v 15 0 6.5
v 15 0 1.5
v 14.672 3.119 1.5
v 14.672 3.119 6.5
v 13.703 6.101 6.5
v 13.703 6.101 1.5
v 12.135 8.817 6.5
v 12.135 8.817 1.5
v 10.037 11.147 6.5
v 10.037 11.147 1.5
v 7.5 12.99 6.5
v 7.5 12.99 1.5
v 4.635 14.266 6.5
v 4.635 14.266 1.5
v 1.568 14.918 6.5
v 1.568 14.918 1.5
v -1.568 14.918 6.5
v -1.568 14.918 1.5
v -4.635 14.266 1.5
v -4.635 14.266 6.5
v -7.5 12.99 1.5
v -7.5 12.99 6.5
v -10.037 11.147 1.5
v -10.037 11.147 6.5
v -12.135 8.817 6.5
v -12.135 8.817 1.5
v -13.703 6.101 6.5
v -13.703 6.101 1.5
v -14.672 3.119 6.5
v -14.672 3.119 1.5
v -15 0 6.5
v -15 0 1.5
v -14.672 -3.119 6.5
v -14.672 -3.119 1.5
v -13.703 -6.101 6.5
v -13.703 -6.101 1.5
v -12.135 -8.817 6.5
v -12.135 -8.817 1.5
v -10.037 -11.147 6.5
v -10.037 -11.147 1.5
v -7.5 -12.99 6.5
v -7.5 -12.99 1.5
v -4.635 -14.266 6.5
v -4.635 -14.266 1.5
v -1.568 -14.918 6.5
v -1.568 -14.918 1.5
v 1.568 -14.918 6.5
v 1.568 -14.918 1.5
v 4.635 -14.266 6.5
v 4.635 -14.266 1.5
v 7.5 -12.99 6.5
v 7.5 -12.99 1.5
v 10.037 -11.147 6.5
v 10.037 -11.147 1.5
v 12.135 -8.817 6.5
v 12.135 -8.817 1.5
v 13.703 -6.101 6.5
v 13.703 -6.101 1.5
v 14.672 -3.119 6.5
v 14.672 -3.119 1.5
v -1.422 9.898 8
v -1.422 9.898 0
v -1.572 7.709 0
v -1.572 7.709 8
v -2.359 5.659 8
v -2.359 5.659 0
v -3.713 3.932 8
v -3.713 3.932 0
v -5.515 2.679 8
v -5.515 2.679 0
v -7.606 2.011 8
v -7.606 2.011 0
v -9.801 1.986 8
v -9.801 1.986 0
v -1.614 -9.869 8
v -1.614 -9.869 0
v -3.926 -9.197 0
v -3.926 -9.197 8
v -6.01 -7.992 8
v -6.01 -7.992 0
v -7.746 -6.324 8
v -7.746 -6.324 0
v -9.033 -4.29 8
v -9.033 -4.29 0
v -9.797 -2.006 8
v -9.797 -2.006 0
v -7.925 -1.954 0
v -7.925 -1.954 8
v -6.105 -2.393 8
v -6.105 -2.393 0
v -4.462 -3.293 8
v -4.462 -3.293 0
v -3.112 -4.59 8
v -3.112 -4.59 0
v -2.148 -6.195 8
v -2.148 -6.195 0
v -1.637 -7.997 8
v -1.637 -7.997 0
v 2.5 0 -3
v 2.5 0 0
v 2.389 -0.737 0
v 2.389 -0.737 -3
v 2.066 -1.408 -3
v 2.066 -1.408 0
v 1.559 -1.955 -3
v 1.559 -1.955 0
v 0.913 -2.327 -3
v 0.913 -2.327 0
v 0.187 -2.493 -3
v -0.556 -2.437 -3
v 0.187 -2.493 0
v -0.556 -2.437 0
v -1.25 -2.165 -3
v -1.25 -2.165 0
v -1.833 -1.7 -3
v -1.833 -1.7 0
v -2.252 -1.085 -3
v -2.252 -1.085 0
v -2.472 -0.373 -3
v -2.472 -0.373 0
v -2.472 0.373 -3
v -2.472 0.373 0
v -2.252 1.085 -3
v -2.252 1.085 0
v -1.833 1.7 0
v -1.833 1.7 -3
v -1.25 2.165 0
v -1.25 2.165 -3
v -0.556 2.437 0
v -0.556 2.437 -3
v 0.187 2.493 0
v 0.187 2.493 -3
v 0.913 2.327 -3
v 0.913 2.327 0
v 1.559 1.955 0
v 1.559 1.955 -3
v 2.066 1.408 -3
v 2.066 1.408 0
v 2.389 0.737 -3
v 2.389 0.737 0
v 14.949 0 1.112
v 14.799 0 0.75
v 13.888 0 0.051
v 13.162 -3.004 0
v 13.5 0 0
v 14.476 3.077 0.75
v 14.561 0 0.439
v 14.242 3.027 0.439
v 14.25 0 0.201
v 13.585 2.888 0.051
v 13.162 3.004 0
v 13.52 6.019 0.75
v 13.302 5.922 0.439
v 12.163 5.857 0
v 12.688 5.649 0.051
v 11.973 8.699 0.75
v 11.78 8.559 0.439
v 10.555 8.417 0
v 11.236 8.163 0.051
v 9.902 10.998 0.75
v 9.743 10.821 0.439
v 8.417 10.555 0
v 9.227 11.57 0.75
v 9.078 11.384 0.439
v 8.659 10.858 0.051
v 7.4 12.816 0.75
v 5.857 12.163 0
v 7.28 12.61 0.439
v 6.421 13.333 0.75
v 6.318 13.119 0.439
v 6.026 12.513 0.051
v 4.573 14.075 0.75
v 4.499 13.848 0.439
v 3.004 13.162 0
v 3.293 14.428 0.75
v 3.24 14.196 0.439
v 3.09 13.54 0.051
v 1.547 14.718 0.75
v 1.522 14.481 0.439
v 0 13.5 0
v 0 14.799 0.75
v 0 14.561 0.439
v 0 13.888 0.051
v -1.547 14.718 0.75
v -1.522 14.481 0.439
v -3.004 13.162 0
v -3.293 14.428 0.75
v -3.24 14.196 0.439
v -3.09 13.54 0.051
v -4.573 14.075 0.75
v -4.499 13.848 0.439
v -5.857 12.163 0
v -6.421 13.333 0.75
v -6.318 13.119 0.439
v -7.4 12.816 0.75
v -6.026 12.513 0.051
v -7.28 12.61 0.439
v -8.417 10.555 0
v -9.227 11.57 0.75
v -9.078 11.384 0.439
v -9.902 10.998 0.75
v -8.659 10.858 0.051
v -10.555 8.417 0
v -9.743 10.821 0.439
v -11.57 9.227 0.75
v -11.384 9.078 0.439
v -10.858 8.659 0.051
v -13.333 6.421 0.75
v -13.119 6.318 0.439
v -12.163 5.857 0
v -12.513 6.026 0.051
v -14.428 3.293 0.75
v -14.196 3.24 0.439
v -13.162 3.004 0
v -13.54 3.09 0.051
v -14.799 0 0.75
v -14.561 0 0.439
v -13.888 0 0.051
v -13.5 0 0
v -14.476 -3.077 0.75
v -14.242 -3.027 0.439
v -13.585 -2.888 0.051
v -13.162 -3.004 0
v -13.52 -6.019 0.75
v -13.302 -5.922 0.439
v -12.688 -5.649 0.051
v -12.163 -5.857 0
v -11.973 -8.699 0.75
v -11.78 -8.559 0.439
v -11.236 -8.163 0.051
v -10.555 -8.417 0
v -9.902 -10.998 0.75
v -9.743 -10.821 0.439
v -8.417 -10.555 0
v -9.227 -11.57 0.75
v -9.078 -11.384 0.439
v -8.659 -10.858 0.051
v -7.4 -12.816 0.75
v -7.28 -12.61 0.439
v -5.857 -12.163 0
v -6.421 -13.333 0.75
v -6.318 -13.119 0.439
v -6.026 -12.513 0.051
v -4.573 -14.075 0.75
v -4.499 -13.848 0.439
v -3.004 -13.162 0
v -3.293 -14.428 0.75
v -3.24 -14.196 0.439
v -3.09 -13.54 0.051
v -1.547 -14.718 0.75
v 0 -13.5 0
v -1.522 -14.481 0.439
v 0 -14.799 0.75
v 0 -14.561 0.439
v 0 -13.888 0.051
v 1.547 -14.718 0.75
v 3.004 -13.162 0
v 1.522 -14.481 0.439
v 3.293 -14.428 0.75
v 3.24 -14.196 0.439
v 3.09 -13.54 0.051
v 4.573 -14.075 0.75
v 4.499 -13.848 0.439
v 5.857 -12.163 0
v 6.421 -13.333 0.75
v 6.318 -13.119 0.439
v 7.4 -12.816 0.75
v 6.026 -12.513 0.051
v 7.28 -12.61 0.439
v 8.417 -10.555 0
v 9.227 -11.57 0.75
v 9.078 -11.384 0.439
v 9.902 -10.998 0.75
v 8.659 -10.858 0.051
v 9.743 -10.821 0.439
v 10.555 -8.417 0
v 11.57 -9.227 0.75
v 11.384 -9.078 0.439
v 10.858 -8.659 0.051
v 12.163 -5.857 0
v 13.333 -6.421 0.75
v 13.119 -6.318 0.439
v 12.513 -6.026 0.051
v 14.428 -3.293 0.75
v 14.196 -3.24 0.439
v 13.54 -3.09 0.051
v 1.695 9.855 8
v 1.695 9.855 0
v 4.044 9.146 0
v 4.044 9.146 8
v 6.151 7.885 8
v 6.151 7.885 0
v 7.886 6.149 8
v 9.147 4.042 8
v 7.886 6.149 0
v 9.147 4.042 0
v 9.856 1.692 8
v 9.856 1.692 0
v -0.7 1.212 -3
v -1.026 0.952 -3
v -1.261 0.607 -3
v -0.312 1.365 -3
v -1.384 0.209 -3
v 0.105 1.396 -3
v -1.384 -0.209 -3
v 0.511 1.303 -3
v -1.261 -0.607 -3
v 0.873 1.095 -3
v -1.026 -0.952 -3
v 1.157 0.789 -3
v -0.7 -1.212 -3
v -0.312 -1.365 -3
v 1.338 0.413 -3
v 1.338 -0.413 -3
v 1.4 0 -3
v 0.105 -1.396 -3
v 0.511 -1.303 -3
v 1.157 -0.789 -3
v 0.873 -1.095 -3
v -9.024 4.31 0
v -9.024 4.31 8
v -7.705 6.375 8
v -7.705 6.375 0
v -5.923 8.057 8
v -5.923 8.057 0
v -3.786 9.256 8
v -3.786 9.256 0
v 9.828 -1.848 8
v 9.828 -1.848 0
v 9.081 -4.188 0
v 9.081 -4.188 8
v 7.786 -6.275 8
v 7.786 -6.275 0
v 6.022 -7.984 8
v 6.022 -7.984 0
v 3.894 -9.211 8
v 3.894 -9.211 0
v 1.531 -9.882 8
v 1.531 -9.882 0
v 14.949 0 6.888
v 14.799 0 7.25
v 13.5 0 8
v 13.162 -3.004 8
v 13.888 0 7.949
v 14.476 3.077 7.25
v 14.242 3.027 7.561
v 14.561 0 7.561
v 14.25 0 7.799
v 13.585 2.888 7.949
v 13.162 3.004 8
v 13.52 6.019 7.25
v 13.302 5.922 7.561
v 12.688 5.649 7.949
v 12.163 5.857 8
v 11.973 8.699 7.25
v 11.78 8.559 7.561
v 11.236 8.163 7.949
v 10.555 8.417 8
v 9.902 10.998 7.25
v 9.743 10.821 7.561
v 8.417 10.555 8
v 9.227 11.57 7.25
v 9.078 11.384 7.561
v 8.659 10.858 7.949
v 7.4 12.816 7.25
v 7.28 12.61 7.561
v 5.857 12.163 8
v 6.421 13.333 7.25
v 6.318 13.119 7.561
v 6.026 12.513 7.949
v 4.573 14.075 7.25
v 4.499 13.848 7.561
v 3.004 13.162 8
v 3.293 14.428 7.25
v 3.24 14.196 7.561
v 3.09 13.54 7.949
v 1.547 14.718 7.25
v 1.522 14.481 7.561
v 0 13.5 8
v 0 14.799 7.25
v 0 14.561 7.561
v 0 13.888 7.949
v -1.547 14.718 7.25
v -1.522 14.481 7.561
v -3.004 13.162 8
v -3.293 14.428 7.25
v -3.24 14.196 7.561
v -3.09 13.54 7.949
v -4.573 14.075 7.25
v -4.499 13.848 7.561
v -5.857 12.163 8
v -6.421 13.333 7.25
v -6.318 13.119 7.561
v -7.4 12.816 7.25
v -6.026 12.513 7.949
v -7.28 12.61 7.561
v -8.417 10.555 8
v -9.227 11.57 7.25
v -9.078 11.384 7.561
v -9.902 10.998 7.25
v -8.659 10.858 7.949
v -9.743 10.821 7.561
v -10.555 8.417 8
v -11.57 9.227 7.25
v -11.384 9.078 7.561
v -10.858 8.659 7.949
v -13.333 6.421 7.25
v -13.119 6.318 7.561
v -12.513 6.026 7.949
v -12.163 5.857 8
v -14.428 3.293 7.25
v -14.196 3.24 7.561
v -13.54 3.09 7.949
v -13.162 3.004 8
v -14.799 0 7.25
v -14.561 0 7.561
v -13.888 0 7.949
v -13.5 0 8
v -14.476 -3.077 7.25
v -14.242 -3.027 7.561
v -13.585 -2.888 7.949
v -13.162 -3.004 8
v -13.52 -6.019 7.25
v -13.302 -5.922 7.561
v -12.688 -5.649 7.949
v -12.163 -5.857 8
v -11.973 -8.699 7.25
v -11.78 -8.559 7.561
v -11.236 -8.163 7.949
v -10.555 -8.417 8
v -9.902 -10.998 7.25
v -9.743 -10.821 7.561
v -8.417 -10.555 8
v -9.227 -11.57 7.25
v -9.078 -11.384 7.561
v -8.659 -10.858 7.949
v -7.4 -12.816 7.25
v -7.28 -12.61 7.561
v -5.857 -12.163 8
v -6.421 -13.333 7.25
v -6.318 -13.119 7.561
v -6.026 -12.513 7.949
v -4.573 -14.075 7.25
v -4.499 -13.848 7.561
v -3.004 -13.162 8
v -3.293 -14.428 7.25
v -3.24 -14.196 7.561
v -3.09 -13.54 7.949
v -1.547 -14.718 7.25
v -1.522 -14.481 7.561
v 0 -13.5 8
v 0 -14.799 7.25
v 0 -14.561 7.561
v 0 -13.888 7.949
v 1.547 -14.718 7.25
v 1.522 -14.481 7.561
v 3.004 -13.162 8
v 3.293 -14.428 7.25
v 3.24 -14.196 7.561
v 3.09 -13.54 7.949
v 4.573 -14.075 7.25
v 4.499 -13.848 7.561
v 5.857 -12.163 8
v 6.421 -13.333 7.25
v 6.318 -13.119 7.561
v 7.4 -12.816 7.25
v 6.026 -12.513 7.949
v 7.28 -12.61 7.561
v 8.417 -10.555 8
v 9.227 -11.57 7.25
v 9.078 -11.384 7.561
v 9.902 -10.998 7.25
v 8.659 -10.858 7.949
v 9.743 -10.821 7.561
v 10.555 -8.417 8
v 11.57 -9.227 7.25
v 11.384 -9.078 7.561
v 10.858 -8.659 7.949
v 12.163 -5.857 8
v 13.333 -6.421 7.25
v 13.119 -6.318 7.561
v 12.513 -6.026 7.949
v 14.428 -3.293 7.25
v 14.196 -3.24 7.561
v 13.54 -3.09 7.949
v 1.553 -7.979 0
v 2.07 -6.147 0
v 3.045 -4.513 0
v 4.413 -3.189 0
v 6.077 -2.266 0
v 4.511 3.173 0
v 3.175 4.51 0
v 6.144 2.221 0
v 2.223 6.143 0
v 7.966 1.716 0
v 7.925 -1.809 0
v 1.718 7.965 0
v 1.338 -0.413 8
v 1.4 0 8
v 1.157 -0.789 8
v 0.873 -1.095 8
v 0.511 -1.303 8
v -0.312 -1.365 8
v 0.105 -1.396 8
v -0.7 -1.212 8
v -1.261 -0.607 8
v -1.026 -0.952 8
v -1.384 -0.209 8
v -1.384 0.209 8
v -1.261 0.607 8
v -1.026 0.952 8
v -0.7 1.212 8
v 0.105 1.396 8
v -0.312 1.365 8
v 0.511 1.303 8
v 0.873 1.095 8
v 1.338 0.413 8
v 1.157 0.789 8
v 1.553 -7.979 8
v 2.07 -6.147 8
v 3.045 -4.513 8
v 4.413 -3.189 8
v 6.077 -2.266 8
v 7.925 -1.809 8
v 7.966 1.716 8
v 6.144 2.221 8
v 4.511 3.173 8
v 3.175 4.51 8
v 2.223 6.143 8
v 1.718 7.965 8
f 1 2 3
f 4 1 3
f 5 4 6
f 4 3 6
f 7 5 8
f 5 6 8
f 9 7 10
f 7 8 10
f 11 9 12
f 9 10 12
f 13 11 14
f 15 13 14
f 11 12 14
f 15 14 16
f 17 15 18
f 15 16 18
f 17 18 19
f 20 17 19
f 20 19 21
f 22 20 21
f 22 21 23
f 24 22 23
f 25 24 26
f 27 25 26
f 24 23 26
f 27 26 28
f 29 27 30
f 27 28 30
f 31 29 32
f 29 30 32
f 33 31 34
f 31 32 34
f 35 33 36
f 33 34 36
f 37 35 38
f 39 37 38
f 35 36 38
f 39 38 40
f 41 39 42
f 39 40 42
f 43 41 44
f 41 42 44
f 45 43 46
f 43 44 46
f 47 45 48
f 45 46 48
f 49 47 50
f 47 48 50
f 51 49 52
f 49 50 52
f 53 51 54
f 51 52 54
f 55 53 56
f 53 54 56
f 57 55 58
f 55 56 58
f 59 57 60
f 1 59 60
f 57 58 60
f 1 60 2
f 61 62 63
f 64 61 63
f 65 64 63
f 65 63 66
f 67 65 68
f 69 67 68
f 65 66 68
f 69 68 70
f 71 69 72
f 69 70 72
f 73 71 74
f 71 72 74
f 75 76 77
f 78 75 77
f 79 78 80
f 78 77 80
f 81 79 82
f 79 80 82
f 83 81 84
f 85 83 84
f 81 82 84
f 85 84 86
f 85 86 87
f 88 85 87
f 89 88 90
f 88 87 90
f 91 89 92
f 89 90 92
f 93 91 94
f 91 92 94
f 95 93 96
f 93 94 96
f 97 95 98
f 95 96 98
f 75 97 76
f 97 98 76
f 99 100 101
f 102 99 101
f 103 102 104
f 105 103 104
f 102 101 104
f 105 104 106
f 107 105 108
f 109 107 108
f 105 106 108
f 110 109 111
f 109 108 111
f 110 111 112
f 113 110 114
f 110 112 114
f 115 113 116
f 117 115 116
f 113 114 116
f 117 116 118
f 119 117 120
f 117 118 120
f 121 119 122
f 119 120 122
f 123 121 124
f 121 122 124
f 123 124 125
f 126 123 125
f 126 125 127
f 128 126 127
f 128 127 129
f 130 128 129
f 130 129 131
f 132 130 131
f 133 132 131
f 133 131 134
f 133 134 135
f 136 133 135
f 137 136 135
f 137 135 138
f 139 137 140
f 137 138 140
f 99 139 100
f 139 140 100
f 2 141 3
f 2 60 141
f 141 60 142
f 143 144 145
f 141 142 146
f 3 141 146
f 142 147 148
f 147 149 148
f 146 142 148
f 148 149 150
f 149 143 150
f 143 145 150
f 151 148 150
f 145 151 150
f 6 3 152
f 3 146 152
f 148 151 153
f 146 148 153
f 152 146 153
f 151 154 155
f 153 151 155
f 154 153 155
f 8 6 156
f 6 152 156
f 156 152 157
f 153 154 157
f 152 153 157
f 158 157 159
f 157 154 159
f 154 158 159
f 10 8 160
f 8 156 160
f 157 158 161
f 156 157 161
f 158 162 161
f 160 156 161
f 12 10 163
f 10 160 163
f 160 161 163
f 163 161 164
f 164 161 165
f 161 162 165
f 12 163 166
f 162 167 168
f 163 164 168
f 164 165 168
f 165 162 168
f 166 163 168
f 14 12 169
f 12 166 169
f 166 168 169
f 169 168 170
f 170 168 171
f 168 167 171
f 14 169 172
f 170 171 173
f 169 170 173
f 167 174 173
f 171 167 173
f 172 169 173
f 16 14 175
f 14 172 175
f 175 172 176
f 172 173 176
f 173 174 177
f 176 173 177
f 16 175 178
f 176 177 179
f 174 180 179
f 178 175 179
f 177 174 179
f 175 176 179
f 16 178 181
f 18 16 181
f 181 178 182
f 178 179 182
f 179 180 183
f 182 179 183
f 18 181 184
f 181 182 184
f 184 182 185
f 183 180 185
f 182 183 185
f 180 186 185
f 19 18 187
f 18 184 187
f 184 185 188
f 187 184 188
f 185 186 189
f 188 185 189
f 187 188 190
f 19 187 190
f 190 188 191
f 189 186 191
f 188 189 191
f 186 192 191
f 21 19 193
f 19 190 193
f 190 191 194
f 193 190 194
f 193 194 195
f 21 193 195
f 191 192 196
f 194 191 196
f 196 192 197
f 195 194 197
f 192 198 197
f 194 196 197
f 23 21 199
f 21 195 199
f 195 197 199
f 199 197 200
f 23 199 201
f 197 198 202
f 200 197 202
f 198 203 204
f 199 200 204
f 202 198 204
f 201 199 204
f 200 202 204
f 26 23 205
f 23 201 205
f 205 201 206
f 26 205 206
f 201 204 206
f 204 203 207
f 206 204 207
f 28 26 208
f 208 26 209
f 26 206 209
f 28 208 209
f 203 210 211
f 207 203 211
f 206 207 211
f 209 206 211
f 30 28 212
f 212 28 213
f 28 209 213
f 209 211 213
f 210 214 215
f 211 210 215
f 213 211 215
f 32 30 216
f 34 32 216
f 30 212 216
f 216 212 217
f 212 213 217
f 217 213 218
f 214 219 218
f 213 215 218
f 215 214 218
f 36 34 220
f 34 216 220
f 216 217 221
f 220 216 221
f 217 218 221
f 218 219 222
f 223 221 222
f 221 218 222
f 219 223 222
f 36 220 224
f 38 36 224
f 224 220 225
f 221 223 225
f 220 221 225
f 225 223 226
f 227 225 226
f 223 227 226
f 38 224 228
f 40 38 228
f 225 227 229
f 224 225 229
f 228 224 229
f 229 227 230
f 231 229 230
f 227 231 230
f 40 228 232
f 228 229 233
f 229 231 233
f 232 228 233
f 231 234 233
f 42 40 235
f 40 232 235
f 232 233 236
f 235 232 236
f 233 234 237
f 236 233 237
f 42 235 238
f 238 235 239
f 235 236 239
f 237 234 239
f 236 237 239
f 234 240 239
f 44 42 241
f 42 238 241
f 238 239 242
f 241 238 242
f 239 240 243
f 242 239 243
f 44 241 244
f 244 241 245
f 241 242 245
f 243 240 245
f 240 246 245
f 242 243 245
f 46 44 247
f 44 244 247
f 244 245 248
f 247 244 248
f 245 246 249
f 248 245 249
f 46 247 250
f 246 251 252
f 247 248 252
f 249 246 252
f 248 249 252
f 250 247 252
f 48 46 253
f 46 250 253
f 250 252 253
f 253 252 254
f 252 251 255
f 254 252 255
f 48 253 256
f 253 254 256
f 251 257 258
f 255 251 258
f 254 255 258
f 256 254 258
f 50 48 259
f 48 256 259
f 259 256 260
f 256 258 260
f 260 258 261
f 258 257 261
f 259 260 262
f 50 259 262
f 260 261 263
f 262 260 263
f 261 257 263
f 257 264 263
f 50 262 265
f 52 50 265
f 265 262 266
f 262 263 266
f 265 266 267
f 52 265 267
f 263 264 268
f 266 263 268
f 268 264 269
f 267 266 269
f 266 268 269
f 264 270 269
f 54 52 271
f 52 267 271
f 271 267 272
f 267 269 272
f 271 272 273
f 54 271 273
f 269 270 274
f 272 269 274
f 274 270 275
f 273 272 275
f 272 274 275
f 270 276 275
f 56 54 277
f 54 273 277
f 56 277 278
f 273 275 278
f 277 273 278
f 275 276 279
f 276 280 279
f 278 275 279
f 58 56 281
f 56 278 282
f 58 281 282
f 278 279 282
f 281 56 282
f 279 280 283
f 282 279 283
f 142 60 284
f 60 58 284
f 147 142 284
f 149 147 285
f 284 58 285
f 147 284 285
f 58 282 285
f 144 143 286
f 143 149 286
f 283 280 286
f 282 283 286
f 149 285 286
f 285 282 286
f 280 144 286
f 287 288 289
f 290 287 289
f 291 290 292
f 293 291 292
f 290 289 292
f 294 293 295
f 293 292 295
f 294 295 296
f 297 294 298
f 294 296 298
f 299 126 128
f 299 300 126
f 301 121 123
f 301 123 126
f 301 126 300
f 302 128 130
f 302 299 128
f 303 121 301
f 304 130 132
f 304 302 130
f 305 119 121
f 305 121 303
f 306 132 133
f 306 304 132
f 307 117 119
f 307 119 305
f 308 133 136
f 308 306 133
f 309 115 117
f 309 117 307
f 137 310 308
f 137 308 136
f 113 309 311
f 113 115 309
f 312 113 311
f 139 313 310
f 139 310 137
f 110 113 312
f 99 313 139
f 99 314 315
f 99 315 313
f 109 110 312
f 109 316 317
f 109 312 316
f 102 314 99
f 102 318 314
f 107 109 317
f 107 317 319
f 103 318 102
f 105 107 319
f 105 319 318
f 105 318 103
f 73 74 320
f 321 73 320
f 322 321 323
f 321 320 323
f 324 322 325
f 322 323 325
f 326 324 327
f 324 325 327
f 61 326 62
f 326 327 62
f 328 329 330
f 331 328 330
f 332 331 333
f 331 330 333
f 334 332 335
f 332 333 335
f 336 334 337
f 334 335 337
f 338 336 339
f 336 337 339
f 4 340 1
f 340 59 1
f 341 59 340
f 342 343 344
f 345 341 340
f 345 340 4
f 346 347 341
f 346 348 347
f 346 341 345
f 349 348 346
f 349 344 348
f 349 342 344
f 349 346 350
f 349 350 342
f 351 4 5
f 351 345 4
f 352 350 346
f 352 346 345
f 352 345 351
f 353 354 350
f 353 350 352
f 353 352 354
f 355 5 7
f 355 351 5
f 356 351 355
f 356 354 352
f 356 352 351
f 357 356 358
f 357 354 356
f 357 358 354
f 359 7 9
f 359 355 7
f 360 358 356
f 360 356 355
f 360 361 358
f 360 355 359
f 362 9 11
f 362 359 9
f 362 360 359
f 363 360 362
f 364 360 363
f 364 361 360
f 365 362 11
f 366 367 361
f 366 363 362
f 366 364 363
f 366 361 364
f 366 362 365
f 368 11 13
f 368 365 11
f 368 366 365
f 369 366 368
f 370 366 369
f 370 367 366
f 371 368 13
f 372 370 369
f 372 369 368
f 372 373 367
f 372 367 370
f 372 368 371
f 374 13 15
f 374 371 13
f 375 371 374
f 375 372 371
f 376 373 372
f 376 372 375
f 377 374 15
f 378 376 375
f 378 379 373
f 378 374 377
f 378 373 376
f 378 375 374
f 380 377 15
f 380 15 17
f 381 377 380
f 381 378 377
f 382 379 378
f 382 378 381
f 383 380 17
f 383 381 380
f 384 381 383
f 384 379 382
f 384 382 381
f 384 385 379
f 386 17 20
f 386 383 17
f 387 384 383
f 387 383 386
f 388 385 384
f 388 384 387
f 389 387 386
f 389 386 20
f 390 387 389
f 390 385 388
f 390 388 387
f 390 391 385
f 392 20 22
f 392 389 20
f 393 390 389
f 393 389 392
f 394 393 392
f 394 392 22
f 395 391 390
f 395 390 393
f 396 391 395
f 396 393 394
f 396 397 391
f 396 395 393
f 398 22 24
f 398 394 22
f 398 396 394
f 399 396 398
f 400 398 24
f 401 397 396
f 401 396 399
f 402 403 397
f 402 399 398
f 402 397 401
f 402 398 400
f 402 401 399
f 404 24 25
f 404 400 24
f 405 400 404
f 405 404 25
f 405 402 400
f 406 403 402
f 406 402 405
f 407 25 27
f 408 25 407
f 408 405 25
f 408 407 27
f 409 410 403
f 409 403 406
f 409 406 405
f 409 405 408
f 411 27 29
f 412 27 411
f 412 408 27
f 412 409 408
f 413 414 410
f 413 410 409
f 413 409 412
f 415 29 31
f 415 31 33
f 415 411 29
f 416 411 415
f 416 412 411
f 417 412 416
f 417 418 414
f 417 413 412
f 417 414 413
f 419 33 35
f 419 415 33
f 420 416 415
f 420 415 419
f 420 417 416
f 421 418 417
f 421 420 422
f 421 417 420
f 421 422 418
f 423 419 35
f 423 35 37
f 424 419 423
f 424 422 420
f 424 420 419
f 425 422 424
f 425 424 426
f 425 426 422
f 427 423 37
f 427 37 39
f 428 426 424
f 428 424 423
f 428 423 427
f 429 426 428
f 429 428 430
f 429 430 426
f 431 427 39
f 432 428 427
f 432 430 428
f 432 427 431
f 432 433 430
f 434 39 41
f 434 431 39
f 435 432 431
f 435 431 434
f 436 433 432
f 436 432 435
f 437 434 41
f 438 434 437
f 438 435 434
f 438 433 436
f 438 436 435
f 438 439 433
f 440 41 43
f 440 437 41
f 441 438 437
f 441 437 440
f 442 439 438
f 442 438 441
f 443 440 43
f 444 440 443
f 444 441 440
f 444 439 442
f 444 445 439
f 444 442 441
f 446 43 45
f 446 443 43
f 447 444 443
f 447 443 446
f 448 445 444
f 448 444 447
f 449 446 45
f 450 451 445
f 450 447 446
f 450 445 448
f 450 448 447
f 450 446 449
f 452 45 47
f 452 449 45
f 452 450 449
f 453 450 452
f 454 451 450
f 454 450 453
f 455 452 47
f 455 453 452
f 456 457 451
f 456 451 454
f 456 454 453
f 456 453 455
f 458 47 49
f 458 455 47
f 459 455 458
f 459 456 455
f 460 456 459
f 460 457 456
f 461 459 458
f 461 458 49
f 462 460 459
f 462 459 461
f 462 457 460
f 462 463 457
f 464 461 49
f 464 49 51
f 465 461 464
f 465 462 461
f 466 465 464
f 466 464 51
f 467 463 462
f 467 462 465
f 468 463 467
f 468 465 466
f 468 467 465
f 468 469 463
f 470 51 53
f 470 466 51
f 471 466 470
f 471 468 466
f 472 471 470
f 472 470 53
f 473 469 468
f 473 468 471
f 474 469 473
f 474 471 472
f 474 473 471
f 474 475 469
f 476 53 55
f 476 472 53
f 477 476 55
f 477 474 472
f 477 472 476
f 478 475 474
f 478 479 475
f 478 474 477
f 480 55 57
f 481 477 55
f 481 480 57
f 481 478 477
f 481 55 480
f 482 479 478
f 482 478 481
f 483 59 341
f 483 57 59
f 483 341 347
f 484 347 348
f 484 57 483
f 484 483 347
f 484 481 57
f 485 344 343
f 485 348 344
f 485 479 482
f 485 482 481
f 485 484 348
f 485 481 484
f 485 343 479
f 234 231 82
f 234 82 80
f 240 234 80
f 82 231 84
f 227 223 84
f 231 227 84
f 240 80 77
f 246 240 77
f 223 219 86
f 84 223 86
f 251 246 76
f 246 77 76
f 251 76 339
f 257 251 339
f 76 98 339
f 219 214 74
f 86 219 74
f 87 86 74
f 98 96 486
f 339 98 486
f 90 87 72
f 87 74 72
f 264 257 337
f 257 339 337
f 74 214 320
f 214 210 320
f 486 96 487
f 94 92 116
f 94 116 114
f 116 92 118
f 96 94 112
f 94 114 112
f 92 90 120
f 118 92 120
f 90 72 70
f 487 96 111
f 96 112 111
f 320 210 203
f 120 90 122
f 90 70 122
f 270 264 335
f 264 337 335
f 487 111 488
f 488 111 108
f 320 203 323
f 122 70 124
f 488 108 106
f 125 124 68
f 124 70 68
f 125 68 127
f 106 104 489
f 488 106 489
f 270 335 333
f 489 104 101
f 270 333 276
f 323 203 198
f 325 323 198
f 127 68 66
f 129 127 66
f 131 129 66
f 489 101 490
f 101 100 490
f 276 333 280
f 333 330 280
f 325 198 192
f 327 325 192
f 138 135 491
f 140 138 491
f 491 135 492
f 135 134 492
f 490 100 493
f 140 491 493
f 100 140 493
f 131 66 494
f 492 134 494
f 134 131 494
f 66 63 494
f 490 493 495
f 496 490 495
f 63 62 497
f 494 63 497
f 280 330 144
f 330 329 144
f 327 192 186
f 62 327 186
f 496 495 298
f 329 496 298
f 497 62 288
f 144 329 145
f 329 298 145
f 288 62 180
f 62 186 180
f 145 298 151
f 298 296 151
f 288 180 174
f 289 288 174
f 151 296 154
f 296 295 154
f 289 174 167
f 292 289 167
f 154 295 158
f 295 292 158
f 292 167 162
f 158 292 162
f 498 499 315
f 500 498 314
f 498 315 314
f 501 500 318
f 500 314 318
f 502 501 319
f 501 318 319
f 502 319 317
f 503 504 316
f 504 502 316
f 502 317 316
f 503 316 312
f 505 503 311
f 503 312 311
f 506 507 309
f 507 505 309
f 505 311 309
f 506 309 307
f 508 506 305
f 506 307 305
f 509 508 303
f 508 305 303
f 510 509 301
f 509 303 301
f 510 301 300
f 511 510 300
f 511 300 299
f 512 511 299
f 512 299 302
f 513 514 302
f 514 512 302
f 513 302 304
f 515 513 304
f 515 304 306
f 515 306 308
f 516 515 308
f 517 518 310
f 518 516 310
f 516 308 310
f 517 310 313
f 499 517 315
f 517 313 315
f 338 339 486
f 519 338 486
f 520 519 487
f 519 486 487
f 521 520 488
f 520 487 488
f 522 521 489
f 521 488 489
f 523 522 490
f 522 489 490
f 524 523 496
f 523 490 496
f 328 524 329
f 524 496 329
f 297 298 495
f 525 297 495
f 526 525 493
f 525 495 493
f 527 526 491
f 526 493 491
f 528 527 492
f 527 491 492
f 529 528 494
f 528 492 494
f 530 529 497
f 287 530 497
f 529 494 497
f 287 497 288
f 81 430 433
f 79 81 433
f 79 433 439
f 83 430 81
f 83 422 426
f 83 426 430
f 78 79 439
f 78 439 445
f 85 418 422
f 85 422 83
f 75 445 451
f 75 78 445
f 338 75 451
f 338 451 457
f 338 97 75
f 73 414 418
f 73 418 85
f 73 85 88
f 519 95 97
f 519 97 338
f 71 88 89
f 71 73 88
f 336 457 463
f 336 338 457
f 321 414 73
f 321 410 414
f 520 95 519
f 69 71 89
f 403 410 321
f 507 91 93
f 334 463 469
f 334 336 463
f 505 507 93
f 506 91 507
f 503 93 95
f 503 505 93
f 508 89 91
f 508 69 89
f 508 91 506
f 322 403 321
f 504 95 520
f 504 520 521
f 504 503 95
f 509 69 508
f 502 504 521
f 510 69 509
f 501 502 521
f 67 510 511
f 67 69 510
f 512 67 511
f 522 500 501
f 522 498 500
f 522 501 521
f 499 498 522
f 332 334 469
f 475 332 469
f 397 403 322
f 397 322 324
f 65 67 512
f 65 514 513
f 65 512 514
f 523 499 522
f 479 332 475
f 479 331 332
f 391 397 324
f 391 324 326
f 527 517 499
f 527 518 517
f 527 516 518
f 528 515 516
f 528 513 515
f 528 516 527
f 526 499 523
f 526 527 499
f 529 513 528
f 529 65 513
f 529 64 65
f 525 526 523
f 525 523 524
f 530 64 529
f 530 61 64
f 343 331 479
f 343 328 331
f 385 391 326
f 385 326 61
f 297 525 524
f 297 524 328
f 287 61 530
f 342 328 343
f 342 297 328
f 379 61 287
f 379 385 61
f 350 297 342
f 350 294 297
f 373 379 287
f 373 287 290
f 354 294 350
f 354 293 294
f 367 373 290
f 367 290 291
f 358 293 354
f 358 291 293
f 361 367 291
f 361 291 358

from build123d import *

# Parameters (mm, degrees)
F0_R     = 15
F0_R_2   = 1.4
F1_DEPTH = 8
F2_R     = 1.5
F3_R     = 1.5
F4_R     = 2.5
F5_DEPTH = 3
F6_R     = 1.4
F7_DEPTH = 25


with BuildPart() as f1:
    # F0 (on Top) → F1 (new body)
    with BuildSketch(Plane.XY):
        Circle(F0_R)
        with BuildLine():
            ThreePointArc((-9.796631, -2.006496), (-3.744207, -3.896689), (-1.614051, -9.868882))
            ThreePointArc((-1.614051, -9.868882), (-6.928578, -7.210743), (-9.796631, -2.006496))
        make_face(mode=Mode.SUBTRACT)
        with BuildLine():
            ThreePointArc((1.531464, -9.882035), (3.685338, -3.80578), (9.827695, -1.848356))
            ThreePointArc((9.827695, -1.848356), (6.956481, -7.183827), (1.531464, -9.882035))
        make_face(mode=Mode.SUBTRACT)
        with BuildLine():
            ThreePointArc((-9.80076, 1.986231), (-6.865646, 7.270688), (-1.421798, 9.898408))
            ThreePointArc((-1.421798, 9.898408), (-3.712984, 3.932034), (-9.80076, 1.986231))
        make_face(mode=Mode.SUBTRACT)
        Circle(F0_R_2, mode=Mode.SUBTRACT)
        with BuildLine():
            ThreePointArc((9.855809, 1.692051), (3.799696, 3.798731), (1.694555, 9.855378))
            ThreePointArc((1.694555, 9.855378), (7.071966, 7.070169), (9.855809, 1.692051))
        make_face(mode=Mode.SUBTRACT)
    extrude(amount=F1_DEPTH)

    # F2
    f2_edges = [f1.edges().sort_by_distance(p)[0] for p in [
        (-15, 0, 8),
    ]]
    fillet(f2_edges, radius=F2_R)

    # F3
    f3_edges = [f1.edges().sort_by_distance(p)[0] for p in [
        (-15, 0, 0),
    ]]
    fillet(f3_edges, radius=F3_R)

    # F4 (on face) → F5 (join)
    with BuildSketch(Plane(origin=(0, 0, 0), x_dir=(1, 0, 0), z_dir=(0, 0, -1))):
        Circle(F4_R)
    extrude(amount=F5_DEPTH)

    # F6 (on face) → F7 (cut)
    with BuildSketch(Plane(origin=(0, 0, -3), x_dir=(1, 0, 0), z_dir=(0, 0, -1))):
        Circle(F6_R)
    extrude(amount=-F7_DEPTH, mode=Mode.SUBTRACT)


solid = f1.part
